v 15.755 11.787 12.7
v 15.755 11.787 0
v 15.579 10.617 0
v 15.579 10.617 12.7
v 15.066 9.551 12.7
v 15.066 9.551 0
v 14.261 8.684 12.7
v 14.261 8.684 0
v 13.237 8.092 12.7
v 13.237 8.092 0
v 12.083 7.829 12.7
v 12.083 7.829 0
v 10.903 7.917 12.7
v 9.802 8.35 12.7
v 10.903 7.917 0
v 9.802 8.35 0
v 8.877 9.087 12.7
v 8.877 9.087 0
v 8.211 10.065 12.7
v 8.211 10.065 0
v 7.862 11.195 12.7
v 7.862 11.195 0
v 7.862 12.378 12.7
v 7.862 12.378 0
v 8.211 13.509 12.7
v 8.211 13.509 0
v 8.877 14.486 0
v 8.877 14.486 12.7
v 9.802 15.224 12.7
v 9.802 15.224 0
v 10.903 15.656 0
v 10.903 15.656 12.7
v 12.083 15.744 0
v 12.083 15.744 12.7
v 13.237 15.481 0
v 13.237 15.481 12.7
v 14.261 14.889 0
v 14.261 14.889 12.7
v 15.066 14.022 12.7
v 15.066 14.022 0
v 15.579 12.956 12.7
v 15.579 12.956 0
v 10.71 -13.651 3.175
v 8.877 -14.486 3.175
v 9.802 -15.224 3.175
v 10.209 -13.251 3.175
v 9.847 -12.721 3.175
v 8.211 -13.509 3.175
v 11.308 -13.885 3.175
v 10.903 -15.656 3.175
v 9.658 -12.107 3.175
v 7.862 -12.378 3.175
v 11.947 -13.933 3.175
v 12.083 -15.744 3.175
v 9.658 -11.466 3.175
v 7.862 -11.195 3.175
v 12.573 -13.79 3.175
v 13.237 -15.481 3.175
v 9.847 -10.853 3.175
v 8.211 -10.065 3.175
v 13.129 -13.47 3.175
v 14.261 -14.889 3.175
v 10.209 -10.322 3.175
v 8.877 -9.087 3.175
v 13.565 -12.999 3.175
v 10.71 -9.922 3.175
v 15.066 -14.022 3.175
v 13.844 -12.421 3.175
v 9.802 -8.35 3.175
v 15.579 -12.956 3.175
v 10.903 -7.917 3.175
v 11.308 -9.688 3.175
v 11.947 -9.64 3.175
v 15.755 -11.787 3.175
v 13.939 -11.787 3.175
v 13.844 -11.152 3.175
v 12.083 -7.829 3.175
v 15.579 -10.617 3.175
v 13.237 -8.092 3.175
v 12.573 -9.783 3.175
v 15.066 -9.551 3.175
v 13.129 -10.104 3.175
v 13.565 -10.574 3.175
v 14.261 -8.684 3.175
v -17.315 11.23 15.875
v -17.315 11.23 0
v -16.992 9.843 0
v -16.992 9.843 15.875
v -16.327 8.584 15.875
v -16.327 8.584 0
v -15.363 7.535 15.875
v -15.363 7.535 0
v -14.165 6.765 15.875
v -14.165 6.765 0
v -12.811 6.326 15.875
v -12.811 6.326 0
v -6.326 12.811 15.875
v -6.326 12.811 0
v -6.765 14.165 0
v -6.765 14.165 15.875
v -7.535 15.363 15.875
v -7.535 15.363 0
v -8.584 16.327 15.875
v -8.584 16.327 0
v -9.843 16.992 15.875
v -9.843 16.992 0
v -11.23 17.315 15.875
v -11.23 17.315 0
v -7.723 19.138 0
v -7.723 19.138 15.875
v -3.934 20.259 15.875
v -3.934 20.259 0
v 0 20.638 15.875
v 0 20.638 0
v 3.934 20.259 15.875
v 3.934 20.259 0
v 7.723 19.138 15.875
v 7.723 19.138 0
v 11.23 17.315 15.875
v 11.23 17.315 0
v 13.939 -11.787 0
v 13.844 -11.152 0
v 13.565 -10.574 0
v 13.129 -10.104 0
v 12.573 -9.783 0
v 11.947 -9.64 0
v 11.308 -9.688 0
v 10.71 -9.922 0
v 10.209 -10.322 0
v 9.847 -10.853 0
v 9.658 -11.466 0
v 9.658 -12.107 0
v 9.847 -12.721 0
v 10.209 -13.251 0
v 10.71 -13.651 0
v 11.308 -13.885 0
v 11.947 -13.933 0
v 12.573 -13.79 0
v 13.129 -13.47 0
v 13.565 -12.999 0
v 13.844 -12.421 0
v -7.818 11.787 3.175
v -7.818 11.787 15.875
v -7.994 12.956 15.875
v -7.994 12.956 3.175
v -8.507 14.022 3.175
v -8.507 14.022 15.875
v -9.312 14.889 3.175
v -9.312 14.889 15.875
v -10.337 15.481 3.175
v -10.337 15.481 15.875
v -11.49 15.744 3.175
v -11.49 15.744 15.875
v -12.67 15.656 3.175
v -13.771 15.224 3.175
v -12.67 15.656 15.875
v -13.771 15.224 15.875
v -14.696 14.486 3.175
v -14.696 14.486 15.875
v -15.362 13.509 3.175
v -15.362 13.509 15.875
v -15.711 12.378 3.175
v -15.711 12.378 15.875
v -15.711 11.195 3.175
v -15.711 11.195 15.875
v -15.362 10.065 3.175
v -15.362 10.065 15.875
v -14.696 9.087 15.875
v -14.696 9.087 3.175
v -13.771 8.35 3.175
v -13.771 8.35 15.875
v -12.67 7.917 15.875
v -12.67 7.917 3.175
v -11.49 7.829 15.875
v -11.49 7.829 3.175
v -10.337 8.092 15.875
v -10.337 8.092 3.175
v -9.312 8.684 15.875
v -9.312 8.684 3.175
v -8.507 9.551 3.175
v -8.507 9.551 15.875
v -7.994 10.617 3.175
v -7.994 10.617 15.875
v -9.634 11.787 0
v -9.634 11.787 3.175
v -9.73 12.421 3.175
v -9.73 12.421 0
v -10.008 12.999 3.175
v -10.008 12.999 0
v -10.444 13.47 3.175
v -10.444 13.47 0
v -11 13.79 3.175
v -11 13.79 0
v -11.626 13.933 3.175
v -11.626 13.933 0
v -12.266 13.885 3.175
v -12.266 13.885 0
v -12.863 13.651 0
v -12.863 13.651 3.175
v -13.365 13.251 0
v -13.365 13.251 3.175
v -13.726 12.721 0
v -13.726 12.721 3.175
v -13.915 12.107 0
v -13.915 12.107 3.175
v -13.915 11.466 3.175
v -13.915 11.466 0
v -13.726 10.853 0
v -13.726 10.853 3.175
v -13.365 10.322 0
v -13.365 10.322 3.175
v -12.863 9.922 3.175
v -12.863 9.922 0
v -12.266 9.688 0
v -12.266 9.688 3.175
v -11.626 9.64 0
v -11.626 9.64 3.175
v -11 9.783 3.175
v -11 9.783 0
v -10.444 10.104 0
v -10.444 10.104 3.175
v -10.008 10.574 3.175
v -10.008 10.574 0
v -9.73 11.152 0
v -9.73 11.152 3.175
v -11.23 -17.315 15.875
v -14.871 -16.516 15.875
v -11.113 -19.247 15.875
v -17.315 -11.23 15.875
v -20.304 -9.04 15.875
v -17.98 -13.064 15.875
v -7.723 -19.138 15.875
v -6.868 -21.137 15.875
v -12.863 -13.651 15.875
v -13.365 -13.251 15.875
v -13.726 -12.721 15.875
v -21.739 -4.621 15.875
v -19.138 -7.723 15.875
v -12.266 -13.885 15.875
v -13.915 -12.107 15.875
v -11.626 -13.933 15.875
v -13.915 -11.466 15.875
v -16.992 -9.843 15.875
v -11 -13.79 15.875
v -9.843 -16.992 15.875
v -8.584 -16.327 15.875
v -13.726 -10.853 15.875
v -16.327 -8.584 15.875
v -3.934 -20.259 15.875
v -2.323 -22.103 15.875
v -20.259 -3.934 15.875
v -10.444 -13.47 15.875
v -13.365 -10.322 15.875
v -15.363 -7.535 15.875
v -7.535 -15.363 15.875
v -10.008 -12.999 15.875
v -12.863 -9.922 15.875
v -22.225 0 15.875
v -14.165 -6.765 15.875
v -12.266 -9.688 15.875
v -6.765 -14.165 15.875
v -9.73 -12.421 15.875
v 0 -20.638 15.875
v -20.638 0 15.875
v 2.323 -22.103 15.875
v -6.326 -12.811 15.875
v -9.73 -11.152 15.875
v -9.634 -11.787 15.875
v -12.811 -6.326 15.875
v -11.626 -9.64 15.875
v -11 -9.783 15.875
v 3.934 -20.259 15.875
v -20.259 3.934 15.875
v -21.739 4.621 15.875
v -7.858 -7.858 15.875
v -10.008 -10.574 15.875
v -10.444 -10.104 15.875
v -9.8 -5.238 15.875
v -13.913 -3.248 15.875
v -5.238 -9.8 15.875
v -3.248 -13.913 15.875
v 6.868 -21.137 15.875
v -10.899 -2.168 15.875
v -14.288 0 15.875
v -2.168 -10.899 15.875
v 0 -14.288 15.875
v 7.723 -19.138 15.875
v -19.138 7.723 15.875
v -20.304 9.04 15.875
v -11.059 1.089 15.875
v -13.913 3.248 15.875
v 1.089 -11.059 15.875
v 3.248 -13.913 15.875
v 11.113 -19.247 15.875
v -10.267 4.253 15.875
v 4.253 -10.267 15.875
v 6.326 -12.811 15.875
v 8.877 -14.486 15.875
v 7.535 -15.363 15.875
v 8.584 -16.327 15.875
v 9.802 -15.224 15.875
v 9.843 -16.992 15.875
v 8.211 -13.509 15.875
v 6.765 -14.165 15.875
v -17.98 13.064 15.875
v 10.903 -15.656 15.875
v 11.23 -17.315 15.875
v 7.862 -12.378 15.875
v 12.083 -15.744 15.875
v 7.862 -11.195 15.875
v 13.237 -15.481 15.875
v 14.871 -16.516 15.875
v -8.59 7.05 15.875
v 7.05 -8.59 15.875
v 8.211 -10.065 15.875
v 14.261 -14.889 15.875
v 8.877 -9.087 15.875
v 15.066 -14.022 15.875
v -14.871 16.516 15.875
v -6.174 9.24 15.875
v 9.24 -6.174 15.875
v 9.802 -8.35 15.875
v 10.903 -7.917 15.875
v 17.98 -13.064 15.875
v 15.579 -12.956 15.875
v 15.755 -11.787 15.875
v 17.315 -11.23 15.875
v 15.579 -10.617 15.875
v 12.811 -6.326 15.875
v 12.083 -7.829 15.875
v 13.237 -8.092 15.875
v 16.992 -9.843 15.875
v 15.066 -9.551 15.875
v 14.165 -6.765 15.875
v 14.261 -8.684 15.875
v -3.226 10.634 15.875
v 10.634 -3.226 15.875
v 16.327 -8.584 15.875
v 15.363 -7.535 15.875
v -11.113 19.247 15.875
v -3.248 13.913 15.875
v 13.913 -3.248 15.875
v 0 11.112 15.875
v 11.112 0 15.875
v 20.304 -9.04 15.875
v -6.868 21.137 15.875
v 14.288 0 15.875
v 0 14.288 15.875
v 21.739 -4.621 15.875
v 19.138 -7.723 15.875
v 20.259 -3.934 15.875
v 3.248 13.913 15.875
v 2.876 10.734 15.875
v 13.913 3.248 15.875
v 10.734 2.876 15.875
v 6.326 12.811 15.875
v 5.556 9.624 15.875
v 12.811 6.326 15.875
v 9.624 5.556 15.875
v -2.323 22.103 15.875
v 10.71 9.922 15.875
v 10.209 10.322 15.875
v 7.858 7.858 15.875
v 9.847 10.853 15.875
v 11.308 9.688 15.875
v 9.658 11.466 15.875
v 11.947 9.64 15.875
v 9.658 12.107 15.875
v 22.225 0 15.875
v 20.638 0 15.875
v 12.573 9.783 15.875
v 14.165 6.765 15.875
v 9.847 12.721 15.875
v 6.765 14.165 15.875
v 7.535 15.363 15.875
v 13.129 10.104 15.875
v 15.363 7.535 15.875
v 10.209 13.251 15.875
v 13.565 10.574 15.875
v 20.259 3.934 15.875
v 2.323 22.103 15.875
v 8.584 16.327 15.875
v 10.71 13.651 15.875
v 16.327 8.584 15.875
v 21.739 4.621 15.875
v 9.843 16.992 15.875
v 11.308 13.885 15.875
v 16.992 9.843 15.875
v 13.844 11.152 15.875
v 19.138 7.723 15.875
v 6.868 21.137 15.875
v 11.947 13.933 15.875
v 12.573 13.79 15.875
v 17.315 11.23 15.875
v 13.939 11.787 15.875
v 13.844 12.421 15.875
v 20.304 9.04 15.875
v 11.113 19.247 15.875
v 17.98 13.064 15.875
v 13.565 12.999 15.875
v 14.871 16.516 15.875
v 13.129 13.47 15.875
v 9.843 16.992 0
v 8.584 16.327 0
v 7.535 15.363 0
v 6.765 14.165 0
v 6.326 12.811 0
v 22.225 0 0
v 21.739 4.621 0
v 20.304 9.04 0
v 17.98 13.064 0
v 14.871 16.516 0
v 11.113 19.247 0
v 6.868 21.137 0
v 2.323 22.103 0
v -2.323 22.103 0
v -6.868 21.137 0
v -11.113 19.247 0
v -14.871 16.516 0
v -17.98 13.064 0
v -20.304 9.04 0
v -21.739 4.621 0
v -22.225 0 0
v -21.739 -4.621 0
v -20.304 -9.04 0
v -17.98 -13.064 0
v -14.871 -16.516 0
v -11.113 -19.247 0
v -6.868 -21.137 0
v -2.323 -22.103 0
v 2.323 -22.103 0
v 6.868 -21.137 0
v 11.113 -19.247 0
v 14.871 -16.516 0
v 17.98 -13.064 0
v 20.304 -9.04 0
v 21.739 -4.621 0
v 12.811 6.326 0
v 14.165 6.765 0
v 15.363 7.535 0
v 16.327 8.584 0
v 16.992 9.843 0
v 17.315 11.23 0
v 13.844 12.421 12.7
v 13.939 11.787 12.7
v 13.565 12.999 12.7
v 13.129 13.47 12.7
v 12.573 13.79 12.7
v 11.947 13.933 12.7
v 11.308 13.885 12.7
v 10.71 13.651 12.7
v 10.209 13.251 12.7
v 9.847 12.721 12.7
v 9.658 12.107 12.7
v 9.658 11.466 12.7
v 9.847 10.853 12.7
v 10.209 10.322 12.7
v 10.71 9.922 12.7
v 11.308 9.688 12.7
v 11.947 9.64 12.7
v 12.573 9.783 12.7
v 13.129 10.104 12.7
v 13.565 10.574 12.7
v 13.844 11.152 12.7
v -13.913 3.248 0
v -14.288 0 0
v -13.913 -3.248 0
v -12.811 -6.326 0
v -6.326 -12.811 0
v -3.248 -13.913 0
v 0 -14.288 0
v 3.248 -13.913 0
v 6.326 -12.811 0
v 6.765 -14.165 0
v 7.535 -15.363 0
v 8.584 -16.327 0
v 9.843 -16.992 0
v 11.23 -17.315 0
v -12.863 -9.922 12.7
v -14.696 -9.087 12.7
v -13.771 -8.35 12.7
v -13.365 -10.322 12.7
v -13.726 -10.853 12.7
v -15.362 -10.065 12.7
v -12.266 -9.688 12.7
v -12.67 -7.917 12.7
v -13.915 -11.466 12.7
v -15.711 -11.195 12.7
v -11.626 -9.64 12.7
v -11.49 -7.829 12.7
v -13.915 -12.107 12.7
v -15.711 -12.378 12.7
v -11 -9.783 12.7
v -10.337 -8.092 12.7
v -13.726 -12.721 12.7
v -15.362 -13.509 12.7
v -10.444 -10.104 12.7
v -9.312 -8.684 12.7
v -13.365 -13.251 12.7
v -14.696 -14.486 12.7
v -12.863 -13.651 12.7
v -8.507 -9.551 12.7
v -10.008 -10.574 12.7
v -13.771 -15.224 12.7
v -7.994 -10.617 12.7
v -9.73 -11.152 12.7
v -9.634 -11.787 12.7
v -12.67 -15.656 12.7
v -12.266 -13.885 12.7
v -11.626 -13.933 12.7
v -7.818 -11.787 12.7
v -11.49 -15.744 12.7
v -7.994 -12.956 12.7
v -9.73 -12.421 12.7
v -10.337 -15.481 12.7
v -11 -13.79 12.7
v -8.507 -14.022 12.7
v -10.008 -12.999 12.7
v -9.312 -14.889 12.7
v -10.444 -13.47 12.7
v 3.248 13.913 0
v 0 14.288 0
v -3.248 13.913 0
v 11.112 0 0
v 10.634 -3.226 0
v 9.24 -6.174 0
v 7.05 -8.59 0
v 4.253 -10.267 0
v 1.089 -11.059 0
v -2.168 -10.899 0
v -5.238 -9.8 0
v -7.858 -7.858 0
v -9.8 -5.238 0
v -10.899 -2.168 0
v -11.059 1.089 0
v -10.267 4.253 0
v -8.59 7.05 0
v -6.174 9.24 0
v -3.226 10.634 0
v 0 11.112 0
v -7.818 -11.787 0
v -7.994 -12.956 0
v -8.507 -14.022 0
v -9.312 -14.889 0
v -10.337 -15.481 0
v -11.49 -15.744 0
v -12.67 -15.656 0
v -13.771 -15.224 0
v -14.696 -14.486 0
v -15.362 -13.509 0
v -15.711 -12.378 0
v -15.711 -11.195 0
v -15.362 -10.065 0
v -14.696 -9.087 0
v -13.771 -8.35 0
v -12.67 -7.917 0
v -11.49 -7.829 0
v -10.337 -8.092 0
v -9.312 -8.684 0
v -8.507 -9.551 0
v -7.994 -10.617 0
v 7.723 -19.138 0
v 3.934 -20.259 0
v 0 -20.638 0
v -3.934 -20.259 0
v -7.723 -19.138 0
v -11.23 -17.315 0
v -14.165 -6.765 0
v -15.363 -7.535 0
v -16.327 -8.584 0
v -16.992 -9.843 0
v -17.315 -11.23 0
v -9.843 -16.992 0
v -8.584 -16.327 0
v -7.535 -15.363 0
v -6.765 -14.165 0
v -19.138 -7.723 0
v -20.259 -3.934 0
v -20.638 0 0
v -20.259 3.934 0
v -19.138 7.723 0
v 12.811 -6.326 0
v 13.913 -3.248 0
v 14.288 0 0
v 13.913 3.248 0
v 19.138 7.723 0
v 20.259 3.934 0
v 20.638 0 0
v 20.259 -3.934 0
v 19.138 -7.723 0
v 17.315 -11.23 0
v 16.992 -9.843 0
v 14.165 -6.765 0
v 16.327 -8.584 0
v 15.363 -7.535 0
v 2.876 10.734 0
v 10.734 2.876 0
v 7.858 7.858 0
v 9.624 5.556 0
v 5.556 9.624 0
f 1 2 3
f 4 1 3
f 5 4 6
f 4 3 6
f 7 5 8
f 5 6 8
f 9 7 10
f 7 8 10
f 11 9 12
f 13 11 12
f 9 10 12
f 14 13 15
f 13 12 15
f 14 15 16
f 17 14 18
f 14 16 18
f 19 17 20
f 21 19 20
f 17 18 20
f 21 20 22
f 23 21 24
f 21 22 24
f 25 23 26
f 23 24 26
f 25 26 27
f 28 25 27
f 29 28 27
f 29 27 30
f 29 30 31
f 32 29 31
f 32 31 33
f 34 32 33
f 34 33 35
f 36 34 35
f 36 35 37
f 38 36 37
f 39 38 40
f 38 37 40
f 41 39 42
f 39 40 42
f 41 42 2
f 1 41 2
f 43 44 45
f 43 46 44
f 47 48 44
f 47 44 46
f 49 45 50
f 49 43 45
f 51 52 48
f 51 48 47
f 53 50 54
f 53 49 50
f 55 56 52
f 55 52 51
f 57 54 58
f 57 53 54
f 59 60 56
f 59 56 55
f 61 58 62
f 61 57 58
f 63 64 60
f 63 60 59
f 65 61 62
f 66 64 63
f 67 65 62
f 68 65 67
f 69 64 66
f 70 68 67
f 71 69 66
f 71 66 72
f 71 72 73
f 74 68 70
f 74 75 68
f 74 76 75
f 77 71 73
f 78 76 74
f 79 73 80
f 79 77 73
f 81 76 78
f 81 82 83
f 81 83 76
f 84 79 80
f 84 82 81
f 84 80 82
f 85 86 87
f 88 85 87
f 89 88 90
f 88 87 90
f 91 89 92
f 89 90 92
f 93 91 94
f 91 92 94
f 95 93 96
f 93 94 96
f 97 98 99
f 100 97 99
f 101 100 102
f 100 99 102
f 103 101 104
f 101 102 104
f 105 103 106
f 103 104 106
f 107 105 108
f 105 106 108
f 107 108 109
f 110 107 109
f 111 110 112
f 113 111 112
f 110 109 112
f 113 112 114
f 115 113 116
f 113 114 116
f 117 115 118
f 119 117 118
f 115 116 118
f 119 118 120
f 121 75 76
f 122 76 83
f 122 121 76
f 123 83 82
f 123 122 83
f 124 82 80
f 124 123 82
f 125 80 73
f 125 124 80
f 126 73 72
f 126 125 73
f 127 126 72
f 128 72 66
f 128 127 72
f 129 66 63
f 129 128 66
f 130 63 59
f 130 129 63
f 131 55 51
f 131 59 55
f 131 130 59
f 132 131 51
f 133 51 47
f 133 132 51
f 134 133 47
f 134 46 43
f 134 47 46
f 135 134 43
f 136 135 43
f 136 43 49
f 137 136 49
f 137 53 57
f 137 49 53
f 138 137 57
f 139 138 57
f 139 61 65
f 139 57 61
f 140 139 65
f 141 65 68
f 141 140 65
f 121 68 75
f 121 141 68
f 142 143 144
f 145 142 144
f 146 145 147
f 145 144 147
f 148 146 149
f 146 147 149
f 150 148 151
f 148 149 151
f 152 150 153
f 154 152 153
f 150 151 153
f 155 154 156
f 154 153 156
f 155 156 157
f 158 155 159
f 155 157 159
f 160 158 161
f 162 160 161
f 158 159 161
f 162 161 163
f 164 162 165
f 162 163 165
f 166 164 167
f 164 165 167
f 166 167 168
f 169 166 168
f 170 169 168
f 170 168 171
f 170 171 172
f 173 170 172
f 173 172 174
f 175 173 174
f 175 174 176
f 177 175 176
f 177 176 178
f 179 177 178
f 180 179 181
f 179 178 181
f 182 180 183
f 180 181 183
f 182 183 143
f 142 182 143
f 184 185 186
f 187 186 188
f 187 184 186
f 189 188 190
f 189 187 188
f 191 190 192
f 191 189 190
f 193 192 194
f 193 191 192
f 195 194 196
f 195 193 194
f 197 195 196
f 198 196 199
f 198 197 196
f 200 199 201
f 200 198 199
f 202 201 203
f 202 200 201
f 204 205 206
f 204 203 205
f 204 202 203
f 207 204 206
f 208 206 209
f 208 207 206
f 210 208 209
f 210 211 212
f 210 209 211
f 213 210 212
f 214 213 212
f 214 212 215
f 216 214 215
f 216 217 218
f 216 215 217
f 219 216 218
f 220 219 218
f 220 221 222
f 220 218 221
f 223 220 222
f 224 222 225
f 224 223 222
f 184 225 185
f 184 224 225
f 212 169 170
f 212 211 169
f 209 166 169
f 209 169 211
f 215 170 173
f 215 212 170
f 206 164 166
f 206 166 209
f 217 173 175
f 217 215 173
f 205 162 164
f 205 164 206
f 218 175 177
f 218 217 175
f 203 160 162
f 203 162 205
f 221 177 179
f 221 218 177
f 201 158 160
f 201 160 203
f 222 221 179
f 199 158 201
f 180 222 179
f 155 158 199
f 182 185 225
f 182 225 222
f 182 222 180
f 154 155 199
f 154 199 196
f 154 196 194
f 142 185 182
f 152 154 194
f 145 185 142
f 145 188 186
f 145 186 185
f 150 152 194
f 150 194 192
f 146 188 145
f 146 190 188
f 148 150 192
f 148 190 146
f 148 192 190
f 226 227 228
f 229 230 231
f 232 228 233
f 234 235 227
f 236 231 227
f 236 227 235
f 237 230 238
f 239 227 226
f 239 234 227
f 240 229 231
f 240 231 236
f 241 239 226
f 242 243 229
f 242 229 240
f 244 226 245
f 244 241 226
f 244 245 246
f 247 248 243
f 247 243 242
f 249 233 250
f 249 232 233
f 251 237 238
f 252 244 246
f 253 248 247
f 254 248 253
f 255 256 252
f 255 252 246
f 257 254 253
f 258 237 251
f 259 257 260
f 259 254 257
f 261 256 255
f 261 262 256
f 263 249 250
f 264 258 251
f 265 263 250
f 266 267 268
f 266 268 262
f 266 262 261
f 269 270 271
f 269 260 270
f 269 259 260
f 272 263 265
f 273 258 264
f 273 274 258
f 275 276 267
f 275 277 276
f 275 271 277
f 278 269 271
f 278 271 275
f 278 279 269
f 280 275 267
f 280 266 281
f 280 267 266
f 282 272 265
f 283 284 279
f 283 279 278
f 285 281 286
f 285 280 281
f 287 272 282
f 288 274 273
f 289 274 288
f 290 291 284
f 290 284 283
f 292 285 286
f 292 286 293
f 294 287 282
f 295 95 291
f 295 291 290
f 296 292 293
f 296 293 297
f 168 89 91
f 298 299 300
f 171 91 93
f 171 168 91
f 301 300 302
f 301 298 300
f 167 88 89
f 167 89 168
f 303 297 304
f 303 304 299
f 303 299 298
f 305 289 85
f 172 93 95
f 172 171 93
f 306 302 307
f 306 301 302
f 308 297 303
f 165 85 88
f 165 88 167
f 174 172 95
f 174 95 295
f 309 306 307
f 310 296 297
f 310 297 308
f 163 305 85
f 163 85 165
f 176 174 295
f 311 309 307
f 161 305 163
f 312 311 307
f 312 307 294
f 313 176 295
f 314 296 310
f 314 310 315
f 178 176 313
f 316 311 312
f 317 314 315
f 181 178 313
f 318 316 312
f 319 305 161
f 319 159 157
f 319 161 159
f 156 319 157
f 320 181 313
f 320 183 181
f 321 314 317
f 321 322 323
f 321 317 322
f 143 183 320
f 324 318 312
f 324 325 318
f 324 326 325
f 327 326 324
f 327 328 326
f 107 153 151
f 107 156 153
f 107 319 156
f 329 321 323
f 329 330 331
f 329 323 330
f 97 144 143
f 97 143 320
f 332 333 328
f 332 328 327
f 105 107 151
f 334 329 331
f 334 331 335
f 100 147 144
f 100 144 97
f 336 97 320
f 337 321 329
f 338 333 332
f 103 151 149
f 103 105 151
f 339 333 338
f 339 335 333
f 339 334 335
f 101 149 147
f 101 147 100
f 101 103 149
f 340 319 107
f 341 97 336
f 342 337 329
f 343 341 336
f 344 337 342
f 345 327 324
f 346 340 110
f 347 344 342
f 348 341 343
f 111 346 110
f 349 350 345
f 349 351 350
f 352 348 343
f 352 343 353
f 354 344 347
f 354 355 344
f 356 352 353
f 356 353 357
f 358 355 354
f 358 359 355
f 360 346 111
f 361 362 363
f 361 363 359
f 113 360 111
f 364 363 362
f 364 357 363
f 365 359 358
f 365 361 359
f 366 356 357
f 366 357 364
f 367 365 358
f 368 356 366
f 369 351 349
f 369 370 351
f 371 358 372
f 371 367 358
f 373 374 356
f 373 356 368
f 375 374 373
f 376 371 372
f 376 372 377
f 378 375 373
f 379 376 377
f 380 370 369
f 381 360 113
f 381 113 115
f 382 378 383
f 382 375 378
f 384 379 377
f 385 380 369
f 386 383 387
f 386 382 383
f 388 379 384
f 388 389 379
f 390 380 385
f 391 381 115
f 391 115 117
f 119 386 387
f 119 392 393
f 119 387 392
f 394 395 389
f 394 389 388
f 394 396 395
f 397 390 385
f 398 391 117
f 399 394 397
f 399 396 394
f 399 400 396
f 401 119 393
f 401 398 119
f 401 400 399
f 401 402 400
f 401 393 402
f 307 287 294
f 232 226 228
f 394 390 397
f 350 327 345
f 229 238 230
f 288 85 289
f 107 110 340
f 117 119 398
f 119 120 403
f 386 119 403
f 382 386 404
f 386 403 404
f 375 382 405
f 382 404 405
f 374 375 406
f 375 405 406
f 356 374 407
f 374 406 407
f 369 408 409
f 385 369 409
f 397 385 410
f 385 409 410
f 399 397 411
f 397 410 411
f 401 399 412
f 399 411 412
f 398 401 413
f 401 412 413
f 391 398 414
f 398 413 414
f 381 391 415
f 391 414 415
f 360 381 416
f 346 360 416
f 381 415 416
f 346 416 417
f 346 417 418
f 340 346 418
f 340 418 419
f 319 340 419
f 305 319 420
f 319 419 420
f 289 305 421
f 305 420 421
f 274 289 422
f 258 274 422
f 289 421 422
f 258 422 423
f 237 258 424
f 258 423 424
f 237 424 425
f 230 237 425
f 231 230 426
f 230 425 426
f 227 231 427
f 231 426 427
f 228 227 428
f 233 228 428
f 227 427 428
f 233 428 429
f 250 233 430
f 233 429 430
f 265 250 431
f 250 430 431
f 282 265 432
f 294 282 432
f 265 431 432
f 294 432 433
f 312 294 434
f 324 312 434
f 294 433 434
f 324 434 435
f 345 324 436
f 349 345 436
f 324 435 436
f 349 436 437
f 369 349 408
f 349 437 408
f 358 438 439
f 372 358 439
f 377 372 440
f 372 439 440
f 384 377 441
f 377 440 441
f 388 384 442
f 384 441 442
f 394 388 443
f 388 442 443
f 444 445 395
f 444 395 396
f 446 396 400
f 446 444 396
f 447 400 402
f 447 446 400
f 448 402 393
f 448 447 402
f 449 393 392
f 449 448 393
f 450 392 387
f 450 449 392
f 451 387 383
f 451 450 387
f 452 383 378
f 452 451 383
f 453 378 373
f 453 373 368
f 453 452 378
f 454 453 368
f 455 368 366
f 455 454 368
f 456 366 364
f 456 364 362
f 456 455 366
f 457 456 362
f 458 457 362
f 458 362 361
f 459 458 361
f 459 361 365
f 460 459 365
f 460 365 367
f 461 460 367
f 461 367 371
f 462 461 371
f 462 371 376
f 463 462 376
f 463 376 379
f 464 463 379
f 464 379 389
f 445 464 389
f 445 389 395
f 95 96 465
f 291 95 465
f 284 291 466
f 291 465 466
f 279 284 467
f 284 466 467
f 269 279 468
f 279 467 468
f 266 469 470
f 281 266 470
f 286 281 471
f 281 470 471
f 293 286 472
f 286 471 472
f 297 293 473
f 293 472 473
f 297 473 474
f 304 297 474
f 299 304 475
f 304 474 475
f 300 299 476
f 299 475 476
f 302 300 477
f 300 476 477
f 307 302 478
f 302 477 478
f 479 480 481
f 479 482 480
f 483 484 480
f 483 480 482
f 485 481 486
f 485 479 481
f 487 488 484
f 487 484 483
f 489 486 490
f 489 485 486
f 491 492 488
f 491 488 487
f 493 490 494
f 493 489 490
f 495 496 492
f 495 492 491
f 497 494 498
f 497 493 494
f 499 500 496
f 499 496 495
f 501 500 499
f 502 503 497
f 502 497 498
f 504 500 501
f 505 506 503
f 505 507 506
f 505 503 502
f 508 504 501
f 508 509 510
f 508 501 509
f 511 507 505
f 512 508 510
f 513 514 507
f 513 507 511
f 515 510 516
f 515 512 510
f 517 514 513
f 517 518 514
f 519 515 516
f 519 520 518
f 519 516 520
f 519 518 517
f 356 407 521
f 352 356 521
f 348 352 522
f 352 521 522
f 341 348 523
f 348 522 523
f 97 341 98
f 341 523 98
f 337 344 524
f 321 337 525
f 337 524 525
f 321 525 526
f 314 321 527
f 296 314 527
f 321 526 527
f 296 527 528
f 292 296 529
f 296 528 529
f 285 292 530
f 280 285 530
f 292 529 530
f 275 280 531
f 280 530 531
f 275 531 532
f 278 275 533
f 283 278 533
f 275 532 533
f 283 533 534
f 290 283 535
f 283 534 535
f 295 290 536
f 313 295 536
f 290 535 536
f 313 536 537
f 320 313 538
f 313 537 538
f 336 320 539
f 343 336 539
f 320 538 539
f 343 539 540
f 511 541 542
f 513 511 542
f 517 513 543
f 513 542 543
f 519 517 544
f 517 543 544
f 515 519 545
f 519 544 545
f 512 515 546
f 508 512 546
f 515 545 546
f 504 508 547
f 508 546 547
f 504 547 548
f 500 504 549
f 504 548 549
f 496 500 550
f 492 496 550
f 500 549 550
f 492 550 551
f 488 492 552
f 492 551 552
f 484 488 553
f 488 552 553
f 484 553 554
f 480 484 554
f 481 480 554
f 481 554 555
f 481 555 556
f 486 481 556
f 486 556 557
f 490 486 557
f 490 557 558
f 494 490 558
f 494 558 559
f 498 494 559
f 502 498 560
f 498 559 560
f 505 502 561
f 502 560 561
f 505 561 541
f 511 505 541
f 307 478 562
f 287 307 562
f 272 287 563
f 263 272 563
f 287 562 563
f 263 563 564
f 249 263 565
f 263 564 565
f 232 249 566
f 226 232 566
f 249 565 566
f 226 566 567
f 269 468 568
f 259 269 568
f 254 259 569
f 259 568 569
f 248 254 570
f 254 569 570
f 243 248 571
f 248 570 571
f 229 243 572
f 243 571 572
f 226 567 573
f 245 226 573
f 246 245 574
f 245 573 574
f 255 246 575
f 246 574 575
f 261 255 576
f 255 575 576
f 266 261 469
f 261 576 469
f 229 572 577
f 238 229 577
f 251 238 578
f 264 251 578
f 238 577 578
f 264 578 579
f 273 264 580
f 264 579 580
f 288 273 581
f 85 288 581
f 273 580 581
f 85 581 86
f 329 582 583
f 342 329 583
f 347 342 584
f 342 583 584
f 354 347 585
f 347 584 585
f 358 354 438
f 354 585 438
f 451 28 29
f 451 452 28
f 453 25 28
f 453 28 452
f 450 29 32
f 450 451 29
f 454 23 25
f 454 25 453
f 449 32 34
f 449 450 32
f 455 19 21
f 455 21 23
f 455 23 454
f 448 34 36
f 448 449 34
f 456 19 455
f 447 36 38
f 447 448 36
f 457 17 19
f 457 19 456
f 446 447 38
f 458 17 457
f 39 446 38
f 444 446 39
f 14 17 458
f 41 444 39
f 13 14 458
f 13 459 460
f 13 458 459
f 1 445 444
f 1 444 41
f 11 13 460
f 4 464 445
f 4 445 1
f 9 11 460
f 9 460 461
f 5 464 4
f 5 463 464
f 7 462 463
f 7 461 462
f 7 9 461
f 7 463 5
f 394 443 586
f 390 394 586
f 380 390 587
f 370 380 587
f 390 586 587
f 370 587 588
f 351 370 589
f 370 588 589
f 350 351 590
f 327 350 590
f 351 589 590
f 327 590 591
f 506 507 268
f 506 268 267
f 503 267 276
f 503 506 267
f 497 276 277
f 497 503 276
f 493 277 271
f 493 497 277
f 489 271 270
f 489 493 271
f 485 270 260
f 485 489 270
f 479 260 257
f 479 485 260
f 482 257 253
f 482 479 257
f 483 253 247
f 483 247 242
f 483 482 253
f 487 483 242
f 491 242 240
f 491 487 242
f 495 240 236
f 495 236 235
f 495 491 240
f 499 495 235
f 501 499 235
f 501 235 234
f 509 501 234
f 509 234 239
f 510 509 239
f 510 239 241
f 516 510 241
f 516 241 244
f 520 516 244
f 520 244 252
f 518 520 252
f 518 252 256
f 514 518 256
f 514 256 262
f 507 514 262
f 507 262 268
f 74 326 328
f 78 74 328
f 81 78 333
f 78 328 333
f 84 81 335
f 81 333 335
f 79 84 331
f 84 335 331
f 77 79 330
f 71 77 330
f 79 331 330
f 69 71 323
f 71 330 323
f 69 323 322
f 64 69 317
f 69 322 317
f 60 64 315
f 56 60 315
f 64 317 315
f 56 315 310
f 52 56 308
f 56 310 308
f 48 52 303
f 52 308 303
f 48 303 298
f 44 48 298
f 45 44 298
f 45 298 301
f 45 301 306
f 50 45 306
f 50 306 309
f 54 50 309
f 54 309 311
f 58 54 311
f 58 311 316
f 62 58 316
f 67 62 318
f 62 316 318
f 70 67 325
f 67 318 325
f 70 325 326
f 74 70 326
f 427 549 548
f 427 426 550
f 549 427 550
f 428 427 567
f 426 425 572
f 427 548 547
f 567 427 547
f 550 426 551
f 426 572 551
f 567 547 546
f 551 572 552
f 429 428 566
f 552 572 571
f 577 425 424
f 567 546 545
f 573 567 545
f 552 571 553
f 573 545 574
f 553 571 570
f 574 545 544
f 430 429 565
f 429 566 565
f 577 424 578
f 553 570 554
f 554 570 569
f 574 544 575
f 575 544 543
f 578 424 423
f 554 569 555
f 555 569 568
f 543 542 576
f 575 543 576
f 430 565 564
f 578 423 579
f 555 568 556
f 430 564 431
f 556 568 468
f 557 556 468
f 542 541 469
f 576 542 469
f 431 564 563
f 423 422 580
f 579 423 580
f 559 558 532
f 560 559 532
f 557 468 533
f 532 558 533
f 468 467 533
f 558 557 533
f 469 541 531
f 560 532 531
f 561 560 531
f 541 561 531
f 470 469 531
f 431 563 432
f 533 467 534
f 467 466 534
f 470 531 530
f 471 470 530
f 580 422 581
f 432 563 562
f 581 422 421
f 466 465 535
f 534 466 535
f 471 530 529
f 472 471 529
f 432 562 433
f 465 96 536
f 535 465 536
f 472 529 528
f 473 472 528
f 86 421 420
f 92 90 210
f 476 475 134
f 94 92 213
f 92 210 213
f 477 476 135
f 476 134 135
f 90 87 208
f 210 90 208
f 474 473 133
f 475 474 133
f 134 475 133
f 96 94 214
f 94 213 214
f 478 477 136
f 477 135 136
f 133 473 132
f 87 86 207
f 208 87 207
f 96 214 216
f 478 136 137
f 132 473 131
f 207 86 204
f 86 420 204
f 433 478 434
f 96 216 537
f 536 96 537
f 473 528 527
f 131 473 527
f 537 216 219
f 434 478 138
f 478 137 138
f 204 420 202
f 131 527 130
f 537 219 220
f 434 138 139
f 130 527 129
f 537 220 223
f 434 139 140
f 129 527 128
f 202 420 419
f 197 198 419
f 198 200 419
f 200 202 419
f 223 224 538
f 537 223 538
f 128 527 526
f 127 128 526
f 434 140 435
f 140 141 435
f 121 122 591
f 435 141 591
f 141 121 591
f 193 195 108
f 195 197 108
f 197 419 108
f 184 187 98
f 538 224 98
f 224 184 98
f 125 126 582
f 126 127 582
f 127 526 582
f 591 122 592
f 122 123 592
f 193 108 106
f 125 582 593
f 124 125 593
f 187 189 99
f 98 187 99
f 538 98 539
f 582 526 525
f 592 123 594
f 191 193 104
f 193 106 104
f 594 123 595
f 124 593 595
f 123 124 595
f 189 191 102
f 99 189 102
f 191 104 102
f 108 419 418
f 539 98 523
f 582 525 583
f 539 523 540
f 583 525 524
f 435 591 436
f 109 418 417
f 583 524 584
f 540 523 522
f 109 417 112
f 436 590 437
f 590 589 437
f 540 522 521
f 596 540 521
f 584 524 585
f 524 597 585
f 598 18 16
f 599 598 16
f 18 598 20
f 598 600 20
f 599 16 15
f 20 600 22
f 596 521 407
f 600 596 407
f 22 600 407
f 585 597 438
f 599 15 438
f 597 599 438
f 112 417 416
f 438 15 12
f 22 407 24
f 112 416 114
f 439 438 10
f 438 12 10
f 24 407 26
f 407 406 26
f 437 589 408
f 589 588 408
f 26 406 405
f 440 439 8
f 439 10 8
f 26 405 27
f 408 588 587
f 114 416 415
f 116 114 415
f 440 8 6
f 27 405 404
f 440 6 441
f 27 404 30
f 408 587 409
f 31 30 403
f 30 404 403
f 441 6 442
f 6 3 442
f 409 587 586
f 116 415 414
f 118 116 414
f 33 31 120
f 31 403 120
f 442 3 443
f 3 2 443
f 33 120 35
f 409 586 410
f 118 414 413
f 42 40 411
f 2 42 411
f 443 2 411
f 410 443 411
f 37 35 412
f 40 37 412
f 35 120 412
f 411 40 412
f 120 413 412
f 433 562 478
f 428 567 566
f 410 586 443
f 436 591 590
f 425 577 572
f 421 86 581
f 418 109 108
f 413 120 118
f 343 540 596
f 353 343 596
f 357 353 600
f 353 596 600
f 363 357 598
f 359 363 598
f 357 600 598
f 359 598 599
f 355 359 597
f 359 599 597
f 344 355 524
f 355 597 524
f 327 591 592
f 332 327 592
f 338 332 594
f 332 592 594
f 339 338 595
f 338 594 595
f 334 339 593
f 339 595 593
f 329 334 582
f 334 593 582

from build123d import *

# Parameters (mm, degrees)
F0_R            = 22.225
F0_R_2          = 2.15265
F1_DEPTH        = 15.875
F4_R            = 3.96875
F5_DEPTH        = 12.7
F6_R            = 3.96875
F7_DEPTH        = 12.7
F9_DEPTH        = 15.875
F9_COPIES_COUNT = 4


# Not quite as in the source:
# - a pattern or mirror of a feature is missing from the dataset's text; its kind, count and spacing are read off the source's solid


with BuildPart() as f1:
    # F0 (on Top) → F1 (new body)
    with BuildSketch(Plane.XY):
        Circle(F0_R)
        with Locations((-11.7865861589, -11.7865861589)):
            Circle(F0_R_2, mode=Mode.SUBTRACT)
        with Locations((11.7865861589, -11.7865861589)):
            Circle(F0_R_2, mode=Mode.SUBTRACT)
        with Locations((-11.7865861589, 11.7865861589)):
            Circle(F0_R_2, mode=Mode.SUBTRACT)
        with BuildLine():
            ThreePointArc((0, 11.1125), (7.8577241059, 7.8577241059), (11.1125, 0))
            ThreePointArc((11.1125, 0), (-7.8577241059, -7.8577241059), (0, 11.1125))
        make_face(mode=Mode.SUBTRACT)
        with Locations((11.7865861589, 11.7865861589)):
            Circle(F0_R_2, mode=Mode.SUBTRACT)
    extrude(amount=F1_DEPTH)

    # F4 (on face) → F5 (cut, through all)
    with BuildSketch(Plane(origin=(0, 0, 0), x_dir=(1, 0, 0), z_dir=(0, 0, -1))):
        with Locations((11.7865861589, -11.7865861589)):
            Circle(F4_R)
        with Locations((-11.7865861589, 11.7865861589)):
            Circle(F4_R)
    extrude(amount=-F5_DEPTH, mode=Mode.SUBTRACT)

    # F6 (on face) → F7 (cut, through all)
    with BuildSketch(Plane.XY.offset(15.875)):
        with Locations((-11.7865861589, 11.7865861589)):
            Circle(F6_R)
        with Locations((11.7865861589, -11.7865861589)):
            Circle(F6_R)
    extrude(amount=-F7_DEPTH, mode=Mode.SUBTRACT)

    # F8 (on face) → F9 (cut, through all)
    with BuildSketch(Plane(origin=(0, 0, 0), x_dir=(1, 0, 0), z_dir=(0, 0, -1))):
        with BuildLine():
            ThreePointArc((-11.229543123, 17.3148424047), (-8.0281867, 15.8788163052), (-6.3255746232, 12.8109235396))
            ThreePointArc((-6.3255746232, 12.8109235396), (0, 14.2875), (6.3255746232, 12.8109235396))
            ThreePointArc((6.3255746232, 12.8109235396), (8.0281867, 15.8788163052), (11.229543123, 17.3148424047))
            ThreePointArc((11.229543123, 17.3148424047), (0, 20.6375), (-11.229543123, 17.3148424047))
        make_face()
    f9 = extrude(amount=-F9_DEPTH, mode=Mode.SUBTRACT)

    # F9_copies: F9 ×4 about axis
    f9_copies_axis = Axis((0, 0, 0), (0, 0, 1))
    for i in range(1, F9_COPIES_COUNT):
        add(f9.rotate(f9_copies_axis, i * 360 / F9_COPIES_COUNT), mode=Mode.SUBTRACT)


solid = f1.part
